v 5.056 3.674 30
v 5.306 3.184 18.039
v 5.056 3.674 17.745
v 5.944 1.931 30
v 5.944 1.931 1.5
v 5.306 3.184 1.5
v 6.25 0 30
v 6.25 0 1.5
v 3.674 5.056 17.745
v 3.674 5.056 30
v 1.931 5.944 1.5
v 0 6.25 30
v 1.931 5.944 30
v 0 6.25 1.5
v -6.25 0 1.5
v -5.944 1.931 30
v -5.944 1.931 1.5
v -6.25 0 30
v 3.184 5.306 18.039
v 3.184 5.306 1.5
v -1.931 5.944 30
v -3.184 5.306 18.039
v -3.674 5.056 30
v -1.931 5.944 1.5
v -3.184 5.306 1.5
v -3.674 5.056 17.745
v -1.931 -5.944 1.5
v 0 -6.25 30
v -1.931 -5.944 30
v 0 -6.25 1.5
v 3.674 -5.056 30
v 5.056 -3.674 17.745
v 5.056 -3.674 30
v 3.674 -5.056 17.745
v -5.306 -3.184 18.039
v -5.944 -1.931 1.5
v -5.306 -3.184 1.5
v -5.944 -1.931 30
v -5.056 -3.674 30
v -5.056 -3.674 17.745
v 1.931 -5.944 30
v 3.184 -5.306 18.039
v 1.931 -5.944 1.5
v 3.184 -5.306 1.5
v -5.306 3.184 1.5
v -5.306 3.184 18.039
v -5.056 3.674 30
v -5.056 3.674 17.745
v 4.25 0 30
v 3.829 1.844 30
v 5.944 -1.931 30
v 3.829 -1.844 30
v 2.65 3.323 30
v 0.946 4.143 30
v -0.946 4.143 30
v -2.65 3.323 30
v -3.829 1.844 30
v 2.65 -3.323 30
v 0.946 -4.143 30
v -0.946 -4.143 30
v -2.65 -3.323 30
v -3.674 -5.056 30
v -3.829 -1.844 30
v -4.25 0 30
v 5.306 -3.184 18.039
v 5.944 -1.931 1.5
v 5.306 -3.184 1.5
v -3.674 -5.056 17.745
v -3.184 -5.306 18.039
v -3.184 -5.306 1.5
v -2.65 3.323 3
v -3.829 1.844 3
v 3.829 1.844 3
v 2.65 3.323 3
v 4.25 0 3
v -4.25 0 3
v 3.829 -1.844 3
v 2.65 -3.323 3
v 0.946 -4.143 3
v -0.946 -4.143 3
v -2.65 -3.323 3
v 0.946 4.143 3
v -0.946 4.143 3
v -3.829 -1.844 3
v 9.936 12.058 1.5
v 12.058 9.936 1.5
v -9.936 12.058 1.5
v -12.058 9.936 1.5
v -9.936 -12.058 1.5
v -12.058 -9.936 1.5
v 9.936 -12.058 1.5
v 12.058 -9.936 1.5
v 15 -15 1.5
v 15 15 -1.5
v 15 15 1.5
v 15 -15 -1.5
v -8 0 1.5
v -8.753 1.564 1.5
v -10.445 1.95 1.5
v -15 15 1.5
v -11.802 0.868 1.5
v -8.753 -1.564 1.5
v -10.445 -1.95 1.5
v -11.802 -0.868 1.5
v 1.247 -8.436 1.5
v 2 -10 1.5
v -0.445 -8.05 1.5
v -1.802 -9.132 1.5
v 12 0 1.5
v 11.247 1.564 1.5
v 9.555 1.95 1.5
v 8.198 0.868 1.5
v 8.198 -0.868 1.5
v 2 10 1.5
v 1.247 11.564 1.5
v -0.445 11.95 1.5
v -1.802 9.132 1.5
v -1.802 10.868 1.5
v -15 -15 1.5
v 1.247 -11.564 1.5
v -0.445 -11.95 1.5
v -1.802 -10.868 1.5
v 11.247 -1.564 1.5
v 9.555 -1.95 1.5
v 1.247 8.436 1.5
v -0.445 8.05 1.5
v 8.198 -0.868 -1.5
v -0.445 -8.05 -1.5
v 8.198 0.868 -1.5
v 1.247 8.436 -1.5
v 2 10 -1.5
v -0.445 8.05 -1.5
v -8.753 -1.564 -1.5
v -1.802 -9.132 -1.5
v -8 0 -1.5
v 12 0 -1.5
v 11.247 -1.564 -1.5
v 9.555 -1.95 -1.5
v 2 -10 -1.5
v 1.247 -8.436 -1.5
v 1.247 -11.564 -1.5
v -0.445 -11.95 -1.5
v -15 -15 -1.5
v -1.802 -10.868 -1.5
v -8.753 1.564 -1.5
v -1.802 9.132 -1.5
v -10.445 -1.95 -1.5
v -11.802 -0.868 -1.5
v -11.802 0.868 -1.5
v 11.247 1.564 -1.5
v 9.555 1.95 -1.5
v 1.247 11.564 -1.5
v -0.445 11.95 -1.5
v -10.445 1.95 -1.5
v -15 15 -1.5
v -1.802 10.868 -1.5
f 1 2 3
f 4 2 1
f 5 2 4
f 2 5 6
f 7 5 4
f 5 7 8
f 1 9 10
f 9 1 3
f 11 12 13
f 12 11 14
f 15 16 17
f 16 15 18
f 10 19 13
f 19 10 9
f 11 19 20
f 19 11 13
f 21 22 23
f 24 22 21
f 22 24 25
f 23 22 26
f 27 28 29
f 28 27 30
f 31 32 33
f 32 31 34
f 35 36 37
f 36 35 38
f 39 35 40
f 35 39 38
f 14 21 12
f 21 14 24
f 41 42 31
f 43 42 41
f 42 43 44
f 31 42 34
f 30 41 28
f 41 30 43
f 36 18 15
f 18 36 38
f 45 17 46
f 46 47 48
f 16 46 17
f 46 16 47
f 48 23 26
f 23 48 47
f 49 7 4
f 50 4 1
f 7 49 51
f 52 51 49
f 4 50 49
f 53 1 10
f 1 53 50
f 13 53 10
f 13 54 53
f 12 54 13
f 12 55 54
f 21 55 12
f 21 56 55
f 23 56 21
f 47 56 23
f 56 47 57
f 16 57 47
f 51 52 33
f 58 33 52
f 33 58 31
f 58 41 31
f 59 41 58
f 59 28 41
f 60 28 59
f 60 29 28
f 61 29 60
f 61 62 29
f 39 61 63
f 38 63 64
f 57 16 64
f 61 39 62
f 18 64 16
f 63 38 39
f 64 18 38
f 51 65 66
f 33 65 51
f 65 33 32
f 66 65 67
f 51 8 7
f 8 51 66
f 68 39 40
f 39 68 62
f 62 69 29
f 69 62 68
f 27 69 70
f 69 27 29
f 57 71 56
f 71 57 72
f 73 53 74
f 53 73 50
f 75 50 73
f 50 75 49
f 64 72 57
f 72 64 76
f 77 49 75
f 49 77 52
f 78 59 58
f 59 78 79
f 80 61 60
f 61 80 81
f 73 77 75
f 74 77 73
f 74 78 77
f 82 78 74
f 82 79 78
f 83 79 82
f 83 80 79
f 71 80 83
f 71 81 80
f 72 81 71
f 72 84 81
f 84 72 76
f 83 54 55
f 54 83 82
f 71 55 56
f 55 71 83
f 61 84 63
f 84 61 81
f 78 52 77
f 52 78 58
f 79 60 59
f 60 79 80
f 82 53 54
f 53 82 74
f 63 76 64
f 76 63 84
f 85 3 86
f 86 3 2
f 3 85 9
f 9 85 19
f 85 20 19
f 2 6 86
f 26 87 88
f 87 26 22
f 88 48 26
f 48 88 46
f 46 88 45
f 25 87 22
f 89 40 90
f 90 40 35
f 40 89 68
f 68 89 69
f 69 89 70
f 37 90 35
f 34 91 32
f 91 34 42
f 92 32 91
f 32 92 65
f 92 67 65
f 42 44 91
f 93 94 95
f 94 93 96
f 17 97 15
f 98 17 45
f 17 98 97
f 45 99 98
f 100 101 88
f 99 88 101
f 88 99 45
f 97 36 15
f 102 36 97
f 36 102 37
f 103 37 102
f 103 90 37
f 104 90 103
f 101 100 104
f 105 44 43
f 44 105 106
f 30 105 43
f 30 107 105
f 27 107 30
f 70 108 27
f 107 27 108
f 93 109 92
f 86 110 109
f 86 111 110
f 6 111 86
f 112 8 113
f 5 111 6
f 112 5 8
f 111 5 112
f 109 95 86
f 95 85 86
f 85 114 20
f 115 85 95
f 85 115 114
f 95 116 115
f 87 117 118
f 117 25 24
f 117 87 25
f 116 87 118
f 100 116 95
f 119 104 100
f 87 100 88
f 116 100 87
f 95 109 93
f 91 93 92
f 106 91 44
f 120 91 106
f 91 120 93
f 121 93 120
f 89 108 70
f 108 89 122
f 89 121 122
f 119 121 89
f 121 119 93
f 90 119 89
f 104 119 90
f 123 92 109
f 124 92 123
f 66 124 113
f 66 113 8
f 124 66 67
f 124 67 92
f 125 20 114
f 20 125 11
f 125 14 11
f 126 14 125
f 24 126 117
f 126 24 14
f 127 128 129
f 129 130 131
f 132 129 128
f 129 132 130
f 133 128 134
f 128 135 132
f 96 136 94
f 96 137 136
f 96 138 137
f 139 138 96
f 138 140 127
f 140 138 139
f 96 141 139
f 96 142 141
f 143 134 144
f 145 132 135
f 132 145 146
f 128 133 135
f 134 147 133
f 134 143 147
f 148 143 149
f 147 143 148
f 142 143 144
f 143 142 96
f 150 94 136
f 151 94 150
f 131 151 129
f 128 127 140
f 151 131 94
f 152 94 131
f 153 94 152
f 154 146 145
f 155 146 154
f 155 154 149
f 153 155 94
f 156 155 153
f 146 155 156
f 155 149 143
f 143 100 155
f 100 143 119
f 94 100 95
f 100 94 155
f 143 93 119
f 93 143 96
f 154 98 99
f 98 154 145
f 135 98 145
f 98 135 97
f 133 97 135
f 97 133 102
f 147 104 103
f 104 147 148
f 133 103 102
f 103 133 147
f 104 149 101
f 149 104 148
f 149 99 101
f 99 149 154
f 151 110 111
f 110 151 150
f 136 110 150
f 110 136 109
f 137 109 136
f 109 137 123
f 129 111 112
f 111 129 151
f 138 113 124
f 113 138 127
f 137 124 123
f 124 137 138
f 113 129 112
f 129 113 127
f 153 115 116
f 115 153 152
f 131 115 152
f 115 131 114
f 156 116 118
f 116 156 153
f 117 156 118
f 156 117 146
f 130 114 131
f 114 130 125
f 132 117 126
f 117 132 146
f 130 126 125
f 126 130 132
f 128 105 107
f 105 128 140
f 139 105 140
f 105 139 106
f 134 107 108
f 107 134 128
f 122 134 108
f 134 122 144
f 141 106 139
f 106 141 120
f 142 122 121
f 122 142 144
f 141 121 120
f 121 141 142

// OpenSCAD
/*
 * Written by Dermot Tynan, Kalopa Research.
 * GPLv2.
 *
 * All dimensions are in mm.
 */

module mast_mount()
{
	difference() {
		translate([0, 0, 15]) cylinder(r = 6.25, h = 30, center = true);
		translate([0, 0, 18]) cylinder(r = 4.25, h = 30, center = true);
	}
}

module support()
{
	intersection() {
		translate([-3.4, 0, 3.4]) rotate([0, 60, 0]) cube([20, 3, 20], center = true);
		translate([0, -5, 0]) cube([12, 10, 18]);
	}
}

module antenna_base()
{
	difference() {
		union() {
			cube([30, 30, 3], center = true);
			mast_mount();
			rotate([0, 0, 45]) translate([5.5, 0, 1.4]) support();
			rotate([0, 0, 135]) translate([5.5, 0, 1.4]) support();
			rotate([0, 0, 225]) translate([5.5, 0, 1.4]) support();
			rotate([0, 0, 315]) translate([5.5, 0, 1.4]) support();
		}
		translate([-10, 0, 0]) cylinder(r = 2, h = 4, center = true);
		translate([10, 0, 0]) cylinder(r = 2, h = 4, center = true);
		translate([0, 10, 0]) cylinder(r = 2, h = 4, center = true);
		translate([0, -10, 0]) cylinder(r = 2, h = 4, center = true);
	}
}

antenna_base();
